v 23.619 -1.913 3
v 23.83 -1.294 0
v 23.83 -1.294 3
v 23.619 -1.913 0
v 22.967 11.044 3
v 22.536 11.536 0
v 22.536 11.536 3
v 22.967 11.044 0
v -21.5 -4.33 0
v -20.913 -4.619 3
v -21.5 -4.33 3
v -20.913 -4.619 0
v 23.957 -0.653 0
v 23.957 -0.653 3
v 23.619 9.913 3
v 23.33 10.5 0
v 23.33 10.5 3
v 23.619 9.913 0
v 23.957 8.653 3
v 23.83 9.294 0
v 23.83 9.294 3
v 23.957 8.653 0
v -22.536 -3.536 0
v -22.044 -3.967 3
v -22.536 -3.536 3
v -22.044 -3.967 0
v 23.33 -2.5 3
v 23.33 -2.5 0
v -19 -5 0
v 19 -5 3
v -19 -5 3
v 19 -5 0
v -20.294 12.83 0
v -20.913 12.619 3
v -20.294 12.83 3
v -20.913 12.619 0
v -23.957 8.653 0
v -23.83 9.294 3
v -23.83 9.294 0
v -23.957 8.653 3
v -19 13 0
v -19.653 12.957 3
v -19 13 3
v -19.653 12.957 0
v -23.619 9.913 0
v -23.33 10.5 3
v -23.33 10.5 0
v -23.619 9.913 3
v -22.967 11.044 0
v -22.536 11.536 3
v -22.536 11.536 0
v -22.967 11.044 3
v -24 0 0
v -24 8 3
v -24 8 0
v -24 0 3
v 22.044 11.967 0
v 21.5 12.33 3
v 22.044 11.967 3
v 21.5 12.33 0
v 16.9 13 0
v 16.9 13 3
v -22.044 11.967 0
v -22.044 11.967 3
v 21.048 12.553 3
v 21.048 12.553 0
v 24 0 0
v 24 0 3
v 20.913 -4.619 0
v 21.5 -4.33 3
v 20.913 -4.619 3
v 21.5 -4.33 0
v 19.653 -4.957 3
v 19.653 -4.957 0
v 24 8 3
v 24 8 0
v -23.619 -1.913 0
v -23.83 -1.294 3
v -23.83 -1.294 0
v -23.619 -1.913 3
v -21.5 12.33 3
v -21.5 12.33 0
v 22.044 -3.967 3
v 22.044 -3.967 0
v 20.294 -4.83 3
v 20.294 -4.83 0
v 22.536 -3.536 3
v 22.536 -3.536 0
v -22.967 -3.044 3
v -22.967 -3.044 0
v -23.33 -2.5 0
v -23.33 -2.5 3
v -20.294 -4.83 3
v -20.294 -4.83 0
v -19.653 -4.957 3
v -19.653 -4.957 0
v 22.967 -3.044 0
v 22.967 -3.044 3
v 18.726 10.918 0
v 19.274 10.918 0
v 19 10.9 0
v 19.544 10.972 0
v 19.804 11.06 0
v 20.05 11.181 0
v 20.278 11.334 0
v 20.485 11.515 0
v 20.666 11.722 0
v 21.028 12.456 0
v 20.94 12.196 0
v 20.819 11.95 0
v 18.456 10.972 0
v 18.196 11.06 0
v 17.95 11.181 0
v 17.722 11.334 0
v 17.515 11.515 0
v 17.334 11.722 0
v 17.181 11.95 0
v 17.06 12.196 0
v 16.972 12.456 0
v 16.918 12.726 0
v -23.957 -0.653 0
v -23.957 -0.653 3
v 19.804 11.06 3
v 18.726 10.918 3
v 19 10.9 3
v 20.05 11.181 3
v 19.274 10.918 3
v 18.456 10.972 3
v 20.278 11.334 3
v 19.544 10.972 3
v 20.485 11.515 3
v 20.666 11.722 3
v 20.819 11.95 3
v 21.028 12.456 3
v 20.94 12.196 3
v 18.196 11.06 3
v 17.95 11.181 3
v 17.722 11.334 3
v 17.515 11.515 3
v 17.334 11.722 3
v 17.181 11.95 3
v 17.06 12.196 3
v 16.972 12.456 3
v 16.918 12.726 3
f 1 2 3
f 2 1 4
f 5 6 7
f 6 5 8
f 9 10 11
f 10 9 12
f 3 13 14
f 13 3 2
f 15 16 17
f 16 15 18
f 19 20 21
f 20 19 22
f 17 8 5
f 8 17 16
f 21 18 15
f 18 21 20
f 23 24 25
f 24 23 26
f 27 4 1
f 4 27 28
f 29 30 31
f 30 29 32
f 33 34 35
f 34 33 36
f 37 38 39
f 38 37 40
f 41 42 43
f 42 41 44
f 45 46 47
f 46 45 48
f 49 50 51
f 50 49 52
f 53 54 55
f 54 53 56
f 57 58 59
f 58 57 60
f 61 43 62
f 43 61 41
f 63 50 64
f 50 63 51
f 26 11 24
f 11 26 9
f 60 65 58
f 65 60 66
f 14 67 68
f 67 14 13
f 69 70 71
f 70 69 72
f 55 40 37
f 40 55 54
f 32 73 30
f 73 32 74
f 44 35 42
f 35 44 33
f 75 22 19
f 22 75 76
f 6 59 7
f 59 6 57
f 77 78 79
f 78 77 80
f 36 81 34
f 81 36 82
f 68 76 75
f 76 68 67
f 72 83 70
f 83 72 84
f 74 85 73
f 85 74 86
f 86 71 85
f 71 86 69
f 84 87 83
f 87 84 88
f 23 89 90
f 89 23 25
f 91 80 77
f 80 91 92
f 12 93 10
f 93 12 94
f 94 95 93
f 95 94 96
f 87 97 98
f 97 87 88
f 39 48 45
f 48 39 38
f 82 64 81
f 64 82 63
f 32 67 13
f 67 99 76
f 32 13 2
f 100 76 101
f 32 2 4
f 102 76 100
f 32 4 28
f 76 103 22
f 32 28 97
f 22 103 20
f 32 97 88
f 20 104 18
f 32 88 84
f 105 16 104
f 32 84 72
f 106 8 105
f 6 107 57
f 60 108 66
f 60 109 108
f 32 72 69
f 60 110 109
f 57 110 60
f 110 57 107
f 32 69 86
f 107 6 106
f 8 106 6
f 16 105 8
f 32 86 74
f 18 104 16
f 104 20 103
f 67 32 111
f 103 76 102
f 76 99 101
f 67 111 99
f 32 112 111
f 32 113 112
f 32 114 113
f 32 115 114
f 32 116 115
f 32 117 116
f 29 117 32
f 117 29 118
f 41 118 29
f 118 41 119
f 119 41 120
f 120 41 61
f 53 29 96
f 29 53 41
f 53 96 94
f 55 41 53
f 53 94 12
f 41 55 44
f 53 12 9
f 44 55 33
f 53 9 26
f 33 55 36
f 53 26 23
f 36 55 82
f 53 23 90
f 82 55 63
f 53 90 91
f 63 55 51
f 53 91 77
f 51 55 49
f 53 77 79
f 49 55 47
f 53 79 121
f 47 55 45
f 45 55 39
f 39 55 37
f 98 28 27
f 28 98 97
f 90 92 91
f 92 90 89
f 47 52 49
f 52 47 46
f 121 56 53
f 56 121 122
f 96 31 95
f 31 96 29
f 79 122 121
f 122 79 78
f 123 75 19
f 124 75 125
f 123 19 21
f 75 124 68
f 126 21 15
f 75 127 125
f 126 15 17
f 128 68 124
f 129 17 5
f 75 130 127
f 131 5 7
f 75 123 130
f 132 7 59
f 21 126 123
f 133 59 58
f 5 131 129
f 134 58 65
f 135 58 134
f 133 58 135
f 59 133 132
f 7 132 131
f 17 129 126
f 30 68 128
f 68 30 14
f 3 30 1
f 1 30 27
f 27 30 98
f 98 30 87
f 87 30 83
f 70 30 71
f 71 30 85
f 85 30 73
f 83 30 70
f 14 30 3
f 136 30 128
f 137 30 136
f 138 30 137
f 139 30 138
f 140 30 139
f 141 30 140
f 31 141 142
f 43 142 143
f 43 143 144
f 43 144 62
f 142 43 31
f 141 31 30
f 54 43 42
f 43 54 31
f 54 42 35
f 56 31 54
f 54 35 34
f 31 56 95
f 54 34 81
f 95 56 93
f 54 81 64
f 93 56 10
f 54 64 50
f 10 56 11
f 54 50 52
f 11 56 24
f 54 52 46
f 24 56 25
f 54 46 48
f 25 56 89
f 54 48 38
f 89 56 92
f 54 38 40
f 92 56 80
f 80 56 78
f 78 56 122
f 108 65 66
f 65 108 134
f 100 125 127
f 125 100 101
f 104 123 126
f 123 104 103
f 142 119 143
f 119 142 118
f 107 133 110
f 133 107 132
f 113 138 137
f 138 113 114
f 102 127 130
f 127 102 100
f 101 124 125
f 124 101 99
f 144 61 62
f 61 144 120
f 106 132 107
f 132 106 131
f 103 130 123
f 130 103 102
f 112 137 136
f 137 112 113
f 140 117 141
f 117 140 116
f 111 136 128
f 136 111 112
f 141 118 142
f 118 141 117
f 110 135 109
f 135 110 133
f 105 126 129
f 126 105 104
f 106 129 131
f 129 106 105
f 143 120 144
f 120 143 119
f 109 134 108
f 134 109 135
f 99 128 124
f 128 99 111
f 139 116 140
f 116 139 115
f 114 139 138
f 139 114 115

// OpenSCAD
/*
  AMMARE.3D PARAMETRIC EXAMPLE
  Replace this example with your own .scad model after testing it.
  Parameters expected from the website:
    label_text, part ("base" or "text"), keychain_type, key_width, key_height
  IMPORTANT: WASM exports STL geometry, not colour. Export base and text separately.
*/
label_text = "AMMAR";
part = "base"; // "base", "text", or "all"
keychain_type = "nama"; // "nama" or "plate"
key_width = 48;
key_height = 18;
base_thickness = 3;
text_thickness = 1.2;
text_size = keychain_type == "plate" ? 5.5 : 8;
$fn = 48;

module base_shape() {
  difference() {
    hull() {
      translate([-key_width/2+5,0,0]) cylinder(h=base_thickness,r=5);
      translate([ key_width/2-5,0,0]) cylinder(h=base_thickness,r=5);
      translate([-key_width/2+5,key_height-10,0]) cylinder(h=base_thickness,r=5);
      translate([ key_width/2-5,key_height-10,0]) cylinder(h=base_thickness,r=5);
    }
    translate([key_width/2-5,key_height-5,-0.1]) cylinder(h=base_thickness+0.2,r=2.1);
  }
}
module raised_text() {
  translate([0,(key_height-10)/2,base_thickness])
    linear_extrude(height=text_thickness)
      text(label_text, size=text_size, halign="center", valign="center",
           font="Liberation Sans:style=Bold", spacing=1);
}
if (part == "base") base_shape();
else if (part == "text") raised_text();
else { base_shape(); raised_text(); }
